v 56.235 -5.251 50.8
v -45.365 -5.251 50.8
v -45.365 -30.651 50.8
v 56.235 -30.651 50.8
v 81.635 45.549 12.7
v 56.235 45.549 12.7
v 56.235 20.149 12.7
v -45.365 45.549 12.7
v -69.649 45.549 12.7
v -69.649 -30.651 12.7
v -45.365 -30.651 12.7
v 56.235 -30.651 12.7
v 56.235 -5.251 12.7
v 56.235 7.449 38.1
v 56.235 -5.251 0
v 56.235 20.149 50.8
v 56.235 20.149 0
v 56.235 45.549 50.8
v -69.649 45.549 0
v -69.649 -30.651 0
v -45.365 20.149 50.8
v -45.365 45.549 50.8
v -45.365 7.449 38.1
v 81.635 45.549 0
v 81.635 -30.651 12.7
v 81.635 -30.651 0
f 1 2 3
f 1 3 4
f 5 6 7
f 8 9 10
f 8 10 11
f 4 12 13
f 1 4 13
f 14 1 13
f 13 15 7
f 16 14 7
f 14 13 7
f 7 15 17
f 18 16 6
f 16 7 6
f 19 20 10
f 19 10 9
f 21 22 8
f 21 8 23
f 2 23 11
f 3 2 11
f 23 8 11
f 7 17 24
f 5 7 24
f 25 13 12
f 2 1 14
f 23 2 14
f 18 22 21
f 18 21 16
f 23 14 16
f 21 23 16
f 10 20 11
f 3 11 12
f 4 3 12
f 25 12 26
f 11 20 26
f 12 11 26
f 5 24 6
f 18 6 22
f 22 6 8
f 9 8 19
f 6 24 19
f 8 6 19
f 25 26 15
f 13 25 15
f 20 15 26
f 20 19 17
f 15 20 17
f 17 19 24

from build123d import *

# Parameters (mm, degrees)
F0_W     = 24.283833
F0_H     = 76.2
F1_DEPTH = 12.7
F2_DEPTH = 50.8
F3_DEPTH = 12.7
F4_DEPTH = 12.7
F6_DEPTH = 125.884833


with BuildPart() as f1:
    # F0 (on Top) → F1 (new body)
    with BuildSketch(Plane.XY):
        with Locations((-57.507079, 7.448686)):
            Rectangle(F0_W, F0_H)
    extrude(amount=F1_DEPTH)

    # F0 (on Top) → F2 (join)
    with BuildSketch(Plane.XY):
        Polygon((56.234837, 45.548686), (-45.365163, 45.548686), (-45.365163, -30.651314), (56.234837, -30.651314), (56.234837, -5.251314), (56.234837, 20.148686), align=None)
    extrude(amount=F2_DEPTH)

    # F0 (on Top) → F3 (join)
    with BuildSketch(Plane.XY):
        Polygon((81.634837, 45.548686), (56.234837, 45.548686), (56.234837, 20.148686), align=None)
    extrude(amount=F3_DEPTH)

    # F0 (on Top) → F4 (join)
    with BuildSketch(Plane.XY):
        Polygon((56.234837, -5.251314), (56.234837, -30.651314), (81.634837, -30.651314), align=None)
    extrude(amount=F4_DEPTH)

    # F5 (on face) → F6 (cut, through all)
    with BuildSketch(Plane.YZ.offset(56.234837)):
        Polygon((20.148686, 50.8), (-5.251314, 50.8), (7.448686, 38.1), align=None)
    extrude(amount=-F6_DEPTH, mode=Mode.SUBTRACT)


solid = f1.part
